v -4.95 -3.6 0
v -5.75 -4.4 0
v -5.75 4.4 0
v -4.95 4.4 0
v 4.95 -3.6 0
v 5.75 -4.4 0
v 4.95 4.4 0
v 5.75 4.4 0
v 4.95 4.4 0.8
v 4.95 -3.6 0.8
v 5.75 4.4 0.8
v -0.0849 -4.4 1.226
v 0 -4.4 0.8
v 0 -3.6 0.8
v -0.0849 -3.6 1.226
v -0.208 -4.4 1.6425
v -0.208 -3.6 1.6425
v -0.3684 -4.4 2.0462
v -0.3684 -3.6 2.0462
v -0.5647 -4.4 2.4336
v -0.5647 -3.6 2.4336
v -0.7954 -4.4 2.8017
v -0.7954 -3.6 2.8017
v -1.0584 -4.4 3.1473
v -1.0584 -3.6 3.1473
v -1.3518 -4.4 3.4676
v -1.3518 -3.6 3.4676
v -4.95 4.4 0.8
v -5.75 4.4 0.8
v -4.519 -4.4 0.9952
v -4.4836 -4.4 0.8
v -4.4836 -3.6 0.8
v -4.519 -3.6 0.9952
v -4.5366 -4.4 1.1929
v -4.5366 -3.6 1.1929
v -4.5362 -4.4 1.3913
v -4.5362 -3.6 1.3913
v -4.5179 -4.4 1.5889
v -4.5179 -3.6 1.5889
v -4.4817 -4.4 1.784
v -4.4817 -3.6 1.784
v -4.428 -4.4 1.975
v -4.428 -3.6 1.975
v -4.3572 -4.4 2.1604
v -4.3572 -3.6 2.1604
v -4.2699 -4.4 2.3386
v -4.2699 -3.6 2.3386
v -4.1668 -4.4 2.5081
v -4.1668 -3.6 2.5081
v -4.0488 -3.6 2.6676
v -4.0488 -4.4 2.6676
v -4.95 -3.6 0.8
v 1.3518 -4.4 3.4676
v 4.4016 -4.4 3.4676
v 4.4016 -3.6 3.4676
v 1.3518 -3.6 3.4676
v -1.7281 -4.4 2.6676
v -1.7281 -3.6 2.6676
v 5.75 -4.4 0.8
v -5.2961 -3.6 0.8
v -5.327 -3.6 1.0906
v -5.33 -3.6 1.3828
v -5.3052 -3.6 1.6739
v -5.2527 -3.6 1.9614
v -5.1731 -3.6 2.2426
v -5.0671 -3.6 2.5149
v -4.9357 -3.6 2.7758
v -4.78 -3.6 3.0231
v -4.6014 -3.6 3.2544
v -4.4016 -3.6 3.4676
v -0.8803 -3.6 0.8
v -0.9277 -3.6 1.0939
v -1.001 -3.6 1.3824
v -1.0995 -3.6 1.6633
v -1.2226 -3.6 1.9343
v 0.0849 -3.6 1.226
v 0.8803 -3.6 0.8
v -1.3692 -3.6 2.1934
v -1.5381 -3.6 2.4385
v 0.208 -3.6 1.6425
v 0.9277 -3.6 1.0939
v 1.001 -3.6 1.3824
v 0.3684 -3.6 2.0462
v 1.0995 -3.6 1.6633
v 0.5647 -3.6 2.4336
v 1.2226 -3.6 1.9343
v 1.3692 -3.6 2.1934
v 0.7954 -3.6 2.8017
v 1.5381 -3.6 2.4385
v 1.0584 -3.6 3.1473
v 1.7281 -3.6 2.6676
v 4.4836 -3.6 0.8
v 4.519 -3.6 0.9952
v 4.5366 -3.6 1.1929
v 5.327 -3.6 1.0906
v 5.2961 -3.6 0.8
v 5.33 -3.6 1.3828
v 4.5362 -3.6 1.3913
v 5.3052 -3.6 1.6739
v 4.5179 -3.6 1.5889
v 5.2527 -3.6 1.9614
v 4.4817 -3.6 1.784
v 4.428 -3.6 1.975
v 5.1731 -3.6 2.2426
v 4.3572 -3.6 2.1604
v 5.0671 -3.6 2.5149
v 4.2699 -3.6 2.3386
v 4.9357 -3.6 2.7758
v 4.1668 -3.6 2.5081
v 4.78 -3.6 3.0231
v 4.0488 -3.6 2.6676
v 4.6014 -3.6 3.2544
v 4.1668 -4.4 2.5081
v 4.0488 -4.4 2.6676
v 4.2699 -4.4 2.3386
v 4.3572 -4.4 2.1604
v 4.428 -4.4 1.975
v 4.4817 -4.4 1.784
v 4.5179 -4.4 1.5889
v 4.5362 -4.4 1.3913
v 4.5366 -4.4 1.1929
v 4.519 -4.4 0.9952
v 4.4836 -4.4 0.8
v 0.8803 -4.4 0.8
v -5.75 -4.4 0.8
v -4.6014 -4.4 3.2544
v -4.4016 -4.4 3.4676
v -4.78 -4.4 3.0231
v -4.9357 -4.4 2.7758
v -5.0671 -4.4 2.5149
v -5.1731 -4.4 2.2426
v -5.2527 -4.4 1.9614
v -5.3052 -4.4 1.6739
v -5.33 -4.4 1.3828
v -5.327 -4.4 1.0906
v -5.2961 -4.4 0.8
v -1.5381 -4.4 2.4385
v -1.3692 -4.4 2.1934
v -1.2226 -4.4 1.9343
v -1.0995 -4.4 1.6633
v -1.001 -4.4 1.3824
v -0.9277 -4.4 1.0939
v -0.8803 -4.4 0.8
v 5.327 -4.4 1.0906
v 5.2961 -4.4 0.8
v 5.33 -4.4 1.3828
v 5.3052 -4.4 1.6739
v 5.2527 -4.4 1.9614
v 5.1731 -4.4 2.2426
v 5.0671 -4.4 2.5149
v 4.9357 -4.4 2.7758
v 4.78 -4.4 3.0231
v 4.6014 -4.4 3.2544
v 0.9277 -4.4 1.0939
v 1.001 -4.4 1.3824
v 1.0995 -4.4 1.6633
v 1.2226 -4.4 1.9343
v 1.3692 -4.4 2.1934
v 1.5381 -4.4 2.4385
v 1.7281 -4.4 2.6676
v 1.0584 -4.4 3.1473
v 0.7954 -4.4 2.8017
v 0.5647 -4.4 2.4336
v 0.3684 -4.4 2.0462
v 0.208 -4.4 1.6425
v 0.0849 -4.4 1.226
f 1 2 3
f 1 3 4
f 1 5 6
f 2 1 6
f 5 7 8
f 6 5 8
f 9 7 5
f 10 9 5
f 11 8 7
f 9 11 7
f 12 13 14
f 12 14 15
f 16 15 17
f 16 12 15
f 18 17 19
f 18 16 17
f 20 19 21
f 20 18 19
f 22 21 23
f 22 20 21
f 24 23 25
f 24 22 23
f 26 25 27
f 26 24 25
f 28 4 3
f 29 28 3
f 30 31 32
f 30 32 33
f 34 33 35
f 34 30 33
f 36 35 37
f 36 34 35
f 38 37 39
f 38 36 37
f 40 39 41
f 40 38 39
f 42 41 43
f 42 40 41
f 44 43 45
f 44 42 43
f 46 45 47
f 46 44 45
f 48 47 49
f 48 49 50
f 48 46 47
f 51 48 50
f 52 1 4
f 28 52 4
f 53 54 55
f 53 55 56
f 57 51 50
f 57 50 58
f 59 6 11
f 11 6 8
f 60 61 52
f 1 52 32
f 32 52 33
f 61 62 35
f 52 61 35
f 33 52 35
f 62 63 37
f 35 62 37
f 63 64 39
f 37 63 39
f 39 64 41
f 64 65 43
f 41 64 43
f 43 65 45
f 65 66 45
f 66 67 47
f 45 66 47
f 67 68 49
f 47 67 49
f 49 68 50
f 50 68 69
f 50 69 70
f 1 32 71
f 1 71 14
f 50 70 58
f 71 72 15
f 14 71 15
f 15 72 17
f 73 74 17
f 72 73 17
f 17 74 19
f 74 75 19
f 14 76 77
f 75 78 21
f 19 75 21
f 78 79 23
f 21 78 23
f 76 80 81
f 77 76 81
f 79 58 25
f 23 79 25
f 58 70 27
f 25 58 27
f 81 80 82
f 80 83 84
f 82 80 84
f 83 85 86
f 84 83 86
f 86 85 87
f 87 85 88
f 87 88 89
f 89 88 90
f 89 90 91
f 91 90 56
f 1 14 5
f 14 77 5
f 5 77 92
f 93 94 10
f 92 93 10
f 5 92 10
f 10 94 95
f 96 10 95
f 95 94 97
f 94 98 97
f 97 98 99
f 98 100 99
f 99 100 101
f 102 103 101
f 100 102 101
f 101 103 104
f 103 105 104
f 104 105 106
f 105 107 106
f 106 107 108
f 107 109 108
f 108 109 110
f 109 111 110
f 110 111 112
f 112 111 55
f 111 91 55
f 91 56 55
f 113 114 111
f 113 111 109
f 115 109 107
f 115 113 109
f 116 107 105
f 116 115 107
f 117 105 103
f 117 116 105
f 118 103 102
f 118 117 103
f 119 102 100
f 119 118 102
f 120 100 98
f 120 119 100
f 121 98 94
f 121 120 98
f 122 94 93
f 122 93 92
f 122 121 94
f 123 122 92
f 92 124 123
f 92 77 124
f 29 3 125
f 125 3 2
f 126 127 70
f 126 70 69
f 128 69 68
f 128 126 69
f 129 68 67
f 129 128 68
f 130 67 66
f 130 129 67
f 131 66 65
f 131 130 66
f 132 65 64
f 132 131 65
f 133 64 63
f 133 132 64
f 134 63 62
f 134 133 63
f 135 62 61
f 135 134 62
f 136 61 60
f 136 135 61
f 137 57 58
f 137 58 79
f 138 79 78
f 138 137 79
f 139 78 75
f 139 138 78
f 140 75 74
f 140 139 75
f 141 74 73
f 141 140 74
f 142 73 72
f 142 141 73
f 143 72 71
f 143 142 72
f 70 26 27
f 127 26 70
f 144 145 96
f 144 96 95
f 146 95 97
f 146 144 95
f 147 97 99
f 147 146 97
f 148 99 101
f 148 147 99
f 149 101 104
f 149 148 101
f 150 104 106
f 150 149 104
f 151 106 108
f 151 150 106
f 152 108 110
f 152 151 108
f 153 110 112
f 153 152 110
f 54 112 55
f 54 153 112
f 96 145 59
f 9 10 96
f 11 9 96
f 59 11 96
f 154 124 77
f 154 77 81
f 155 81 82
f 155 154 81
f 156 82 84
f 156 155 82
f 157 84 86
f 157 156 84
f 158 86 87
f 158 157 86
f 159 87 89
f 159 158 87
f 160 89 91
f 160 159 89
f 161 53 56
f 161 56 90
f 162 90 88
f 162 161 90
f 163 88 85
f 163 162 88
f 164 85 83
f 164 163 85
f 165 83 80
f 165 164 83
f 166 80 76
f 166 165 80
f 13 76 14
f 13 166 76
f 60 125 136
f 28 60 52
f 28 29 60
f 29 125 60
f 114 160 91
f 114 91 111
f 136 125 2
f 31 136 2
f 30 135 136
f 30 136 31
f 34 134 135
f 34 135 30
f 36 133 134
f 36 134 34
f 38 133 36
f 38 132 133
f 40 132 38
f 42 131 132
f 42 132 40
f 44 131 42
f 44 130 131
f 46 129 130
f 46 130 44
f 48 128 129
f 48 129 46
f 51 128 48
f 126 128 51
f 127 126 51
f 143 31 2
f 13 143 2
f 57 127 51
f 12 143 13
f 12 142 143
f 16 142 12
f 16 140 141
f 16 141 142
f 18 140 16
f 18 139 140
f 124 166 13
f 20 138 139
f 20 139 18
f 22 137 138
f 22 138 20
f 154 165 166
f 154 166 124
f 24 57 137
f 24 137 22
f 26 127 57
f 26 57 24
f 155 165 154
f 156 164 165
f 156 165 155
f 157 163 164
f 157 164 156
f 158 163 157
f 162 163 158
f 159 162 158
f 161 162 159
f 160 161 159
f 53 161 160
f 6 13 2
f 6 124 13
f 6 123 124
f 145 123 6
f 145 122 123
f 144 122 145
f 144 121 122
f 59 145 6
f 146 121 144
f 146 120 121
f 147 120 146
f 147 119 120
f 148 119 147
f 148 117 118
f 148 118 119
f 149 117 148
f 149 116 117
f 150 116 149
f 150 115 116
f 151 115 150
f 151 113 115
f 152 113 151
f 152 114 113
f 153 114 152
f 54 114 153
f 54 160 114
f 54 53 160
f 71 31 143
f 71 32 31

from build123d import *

# Parameters (mm, degrees)
F1_DEPTH = 0.8
F3_DEPTH = 0.8


with BuildPart() as f1:
    # F0 (on Top) → F1 (new body)
    with BuildSketch(Plane.XY):
        Polygon((5.75, -4.4), (5.75, 4.4), (4.95, 4.4), (4.95, -3.6), (-4.95, -3.6), (-4.95, 4.4), (-5.75, 4.4), (-5.75, -4.4), align=None)
    extrude(amount=F1_DEPTH)

    # F2 (on face) → F3 (join)
    with BuildSketch(Plane.XZ.offset(4.4)):
        with BuildLine():
            Line((-1.3517540975, 3.4676363777), (-4.4016095807, 3.4676363777))
            ThreePointArc((-4.4016095807, 3.4676363777), (-5.1731426527, 2.2425551298), (-5.2961143665, 0.8))
            Line((-5.2961143665, 0.8), (-4.4836062007, 0.8))
            ThreePointArc((-4.4836062007, 0.8), (-4.4816891927, 1.7839754849), (-4.0488441208, 2.6676363777))
            Line((-4.0488441208, 2.6676363777), (-1.7281457549, 2.6676363777))
            ThreePointArc((-1.7281457549, 2.6676363777), (-1.1580554374, 1.8001751094), (-0.8803113597, 0.8))
            Line((-0.8803113597, 0.8), (0, 0.8))
            ThreePointArc((0, 0.8), (-0.4621715879, 2.2421077724), (-1.3517540975, 3.4676363777))
        make_face()
        with BuildLine():
            ThreePointArc((1.3517540975, 3.4676363777), (0.4621715879, 2.2421077724), (0, 0.8))
            Line((0, 0.8), (0.8803113597, 0.8))
            ThreePointArc((0.8803113597, 0.8), (1.1580554374, 1.8001751094), (1.7281457549, 2.6676363777))
            Line((1.7281457549, 2.6676363777), (4.0488441208, 2.6676363777))
            ThreePointArc((4.0488441208, 2.6676363777), (4.4816891927, 1.7839754849), (4.4836062007, 0.8))
            Line((4.4836062007, 0.8), (5.2961143665, 0.8))
            ThreePointArc((5.2961143665, 0.8), (5.1731426527, 2.2425551298), (4.4016095807, 3.4676363777))
            Line((4.4016095807, 3.4676363777), (1.3517540975, 3.4676363777))
        make_face()
    extrude(amount=-F3_DEPTH)


solid = f1.part
